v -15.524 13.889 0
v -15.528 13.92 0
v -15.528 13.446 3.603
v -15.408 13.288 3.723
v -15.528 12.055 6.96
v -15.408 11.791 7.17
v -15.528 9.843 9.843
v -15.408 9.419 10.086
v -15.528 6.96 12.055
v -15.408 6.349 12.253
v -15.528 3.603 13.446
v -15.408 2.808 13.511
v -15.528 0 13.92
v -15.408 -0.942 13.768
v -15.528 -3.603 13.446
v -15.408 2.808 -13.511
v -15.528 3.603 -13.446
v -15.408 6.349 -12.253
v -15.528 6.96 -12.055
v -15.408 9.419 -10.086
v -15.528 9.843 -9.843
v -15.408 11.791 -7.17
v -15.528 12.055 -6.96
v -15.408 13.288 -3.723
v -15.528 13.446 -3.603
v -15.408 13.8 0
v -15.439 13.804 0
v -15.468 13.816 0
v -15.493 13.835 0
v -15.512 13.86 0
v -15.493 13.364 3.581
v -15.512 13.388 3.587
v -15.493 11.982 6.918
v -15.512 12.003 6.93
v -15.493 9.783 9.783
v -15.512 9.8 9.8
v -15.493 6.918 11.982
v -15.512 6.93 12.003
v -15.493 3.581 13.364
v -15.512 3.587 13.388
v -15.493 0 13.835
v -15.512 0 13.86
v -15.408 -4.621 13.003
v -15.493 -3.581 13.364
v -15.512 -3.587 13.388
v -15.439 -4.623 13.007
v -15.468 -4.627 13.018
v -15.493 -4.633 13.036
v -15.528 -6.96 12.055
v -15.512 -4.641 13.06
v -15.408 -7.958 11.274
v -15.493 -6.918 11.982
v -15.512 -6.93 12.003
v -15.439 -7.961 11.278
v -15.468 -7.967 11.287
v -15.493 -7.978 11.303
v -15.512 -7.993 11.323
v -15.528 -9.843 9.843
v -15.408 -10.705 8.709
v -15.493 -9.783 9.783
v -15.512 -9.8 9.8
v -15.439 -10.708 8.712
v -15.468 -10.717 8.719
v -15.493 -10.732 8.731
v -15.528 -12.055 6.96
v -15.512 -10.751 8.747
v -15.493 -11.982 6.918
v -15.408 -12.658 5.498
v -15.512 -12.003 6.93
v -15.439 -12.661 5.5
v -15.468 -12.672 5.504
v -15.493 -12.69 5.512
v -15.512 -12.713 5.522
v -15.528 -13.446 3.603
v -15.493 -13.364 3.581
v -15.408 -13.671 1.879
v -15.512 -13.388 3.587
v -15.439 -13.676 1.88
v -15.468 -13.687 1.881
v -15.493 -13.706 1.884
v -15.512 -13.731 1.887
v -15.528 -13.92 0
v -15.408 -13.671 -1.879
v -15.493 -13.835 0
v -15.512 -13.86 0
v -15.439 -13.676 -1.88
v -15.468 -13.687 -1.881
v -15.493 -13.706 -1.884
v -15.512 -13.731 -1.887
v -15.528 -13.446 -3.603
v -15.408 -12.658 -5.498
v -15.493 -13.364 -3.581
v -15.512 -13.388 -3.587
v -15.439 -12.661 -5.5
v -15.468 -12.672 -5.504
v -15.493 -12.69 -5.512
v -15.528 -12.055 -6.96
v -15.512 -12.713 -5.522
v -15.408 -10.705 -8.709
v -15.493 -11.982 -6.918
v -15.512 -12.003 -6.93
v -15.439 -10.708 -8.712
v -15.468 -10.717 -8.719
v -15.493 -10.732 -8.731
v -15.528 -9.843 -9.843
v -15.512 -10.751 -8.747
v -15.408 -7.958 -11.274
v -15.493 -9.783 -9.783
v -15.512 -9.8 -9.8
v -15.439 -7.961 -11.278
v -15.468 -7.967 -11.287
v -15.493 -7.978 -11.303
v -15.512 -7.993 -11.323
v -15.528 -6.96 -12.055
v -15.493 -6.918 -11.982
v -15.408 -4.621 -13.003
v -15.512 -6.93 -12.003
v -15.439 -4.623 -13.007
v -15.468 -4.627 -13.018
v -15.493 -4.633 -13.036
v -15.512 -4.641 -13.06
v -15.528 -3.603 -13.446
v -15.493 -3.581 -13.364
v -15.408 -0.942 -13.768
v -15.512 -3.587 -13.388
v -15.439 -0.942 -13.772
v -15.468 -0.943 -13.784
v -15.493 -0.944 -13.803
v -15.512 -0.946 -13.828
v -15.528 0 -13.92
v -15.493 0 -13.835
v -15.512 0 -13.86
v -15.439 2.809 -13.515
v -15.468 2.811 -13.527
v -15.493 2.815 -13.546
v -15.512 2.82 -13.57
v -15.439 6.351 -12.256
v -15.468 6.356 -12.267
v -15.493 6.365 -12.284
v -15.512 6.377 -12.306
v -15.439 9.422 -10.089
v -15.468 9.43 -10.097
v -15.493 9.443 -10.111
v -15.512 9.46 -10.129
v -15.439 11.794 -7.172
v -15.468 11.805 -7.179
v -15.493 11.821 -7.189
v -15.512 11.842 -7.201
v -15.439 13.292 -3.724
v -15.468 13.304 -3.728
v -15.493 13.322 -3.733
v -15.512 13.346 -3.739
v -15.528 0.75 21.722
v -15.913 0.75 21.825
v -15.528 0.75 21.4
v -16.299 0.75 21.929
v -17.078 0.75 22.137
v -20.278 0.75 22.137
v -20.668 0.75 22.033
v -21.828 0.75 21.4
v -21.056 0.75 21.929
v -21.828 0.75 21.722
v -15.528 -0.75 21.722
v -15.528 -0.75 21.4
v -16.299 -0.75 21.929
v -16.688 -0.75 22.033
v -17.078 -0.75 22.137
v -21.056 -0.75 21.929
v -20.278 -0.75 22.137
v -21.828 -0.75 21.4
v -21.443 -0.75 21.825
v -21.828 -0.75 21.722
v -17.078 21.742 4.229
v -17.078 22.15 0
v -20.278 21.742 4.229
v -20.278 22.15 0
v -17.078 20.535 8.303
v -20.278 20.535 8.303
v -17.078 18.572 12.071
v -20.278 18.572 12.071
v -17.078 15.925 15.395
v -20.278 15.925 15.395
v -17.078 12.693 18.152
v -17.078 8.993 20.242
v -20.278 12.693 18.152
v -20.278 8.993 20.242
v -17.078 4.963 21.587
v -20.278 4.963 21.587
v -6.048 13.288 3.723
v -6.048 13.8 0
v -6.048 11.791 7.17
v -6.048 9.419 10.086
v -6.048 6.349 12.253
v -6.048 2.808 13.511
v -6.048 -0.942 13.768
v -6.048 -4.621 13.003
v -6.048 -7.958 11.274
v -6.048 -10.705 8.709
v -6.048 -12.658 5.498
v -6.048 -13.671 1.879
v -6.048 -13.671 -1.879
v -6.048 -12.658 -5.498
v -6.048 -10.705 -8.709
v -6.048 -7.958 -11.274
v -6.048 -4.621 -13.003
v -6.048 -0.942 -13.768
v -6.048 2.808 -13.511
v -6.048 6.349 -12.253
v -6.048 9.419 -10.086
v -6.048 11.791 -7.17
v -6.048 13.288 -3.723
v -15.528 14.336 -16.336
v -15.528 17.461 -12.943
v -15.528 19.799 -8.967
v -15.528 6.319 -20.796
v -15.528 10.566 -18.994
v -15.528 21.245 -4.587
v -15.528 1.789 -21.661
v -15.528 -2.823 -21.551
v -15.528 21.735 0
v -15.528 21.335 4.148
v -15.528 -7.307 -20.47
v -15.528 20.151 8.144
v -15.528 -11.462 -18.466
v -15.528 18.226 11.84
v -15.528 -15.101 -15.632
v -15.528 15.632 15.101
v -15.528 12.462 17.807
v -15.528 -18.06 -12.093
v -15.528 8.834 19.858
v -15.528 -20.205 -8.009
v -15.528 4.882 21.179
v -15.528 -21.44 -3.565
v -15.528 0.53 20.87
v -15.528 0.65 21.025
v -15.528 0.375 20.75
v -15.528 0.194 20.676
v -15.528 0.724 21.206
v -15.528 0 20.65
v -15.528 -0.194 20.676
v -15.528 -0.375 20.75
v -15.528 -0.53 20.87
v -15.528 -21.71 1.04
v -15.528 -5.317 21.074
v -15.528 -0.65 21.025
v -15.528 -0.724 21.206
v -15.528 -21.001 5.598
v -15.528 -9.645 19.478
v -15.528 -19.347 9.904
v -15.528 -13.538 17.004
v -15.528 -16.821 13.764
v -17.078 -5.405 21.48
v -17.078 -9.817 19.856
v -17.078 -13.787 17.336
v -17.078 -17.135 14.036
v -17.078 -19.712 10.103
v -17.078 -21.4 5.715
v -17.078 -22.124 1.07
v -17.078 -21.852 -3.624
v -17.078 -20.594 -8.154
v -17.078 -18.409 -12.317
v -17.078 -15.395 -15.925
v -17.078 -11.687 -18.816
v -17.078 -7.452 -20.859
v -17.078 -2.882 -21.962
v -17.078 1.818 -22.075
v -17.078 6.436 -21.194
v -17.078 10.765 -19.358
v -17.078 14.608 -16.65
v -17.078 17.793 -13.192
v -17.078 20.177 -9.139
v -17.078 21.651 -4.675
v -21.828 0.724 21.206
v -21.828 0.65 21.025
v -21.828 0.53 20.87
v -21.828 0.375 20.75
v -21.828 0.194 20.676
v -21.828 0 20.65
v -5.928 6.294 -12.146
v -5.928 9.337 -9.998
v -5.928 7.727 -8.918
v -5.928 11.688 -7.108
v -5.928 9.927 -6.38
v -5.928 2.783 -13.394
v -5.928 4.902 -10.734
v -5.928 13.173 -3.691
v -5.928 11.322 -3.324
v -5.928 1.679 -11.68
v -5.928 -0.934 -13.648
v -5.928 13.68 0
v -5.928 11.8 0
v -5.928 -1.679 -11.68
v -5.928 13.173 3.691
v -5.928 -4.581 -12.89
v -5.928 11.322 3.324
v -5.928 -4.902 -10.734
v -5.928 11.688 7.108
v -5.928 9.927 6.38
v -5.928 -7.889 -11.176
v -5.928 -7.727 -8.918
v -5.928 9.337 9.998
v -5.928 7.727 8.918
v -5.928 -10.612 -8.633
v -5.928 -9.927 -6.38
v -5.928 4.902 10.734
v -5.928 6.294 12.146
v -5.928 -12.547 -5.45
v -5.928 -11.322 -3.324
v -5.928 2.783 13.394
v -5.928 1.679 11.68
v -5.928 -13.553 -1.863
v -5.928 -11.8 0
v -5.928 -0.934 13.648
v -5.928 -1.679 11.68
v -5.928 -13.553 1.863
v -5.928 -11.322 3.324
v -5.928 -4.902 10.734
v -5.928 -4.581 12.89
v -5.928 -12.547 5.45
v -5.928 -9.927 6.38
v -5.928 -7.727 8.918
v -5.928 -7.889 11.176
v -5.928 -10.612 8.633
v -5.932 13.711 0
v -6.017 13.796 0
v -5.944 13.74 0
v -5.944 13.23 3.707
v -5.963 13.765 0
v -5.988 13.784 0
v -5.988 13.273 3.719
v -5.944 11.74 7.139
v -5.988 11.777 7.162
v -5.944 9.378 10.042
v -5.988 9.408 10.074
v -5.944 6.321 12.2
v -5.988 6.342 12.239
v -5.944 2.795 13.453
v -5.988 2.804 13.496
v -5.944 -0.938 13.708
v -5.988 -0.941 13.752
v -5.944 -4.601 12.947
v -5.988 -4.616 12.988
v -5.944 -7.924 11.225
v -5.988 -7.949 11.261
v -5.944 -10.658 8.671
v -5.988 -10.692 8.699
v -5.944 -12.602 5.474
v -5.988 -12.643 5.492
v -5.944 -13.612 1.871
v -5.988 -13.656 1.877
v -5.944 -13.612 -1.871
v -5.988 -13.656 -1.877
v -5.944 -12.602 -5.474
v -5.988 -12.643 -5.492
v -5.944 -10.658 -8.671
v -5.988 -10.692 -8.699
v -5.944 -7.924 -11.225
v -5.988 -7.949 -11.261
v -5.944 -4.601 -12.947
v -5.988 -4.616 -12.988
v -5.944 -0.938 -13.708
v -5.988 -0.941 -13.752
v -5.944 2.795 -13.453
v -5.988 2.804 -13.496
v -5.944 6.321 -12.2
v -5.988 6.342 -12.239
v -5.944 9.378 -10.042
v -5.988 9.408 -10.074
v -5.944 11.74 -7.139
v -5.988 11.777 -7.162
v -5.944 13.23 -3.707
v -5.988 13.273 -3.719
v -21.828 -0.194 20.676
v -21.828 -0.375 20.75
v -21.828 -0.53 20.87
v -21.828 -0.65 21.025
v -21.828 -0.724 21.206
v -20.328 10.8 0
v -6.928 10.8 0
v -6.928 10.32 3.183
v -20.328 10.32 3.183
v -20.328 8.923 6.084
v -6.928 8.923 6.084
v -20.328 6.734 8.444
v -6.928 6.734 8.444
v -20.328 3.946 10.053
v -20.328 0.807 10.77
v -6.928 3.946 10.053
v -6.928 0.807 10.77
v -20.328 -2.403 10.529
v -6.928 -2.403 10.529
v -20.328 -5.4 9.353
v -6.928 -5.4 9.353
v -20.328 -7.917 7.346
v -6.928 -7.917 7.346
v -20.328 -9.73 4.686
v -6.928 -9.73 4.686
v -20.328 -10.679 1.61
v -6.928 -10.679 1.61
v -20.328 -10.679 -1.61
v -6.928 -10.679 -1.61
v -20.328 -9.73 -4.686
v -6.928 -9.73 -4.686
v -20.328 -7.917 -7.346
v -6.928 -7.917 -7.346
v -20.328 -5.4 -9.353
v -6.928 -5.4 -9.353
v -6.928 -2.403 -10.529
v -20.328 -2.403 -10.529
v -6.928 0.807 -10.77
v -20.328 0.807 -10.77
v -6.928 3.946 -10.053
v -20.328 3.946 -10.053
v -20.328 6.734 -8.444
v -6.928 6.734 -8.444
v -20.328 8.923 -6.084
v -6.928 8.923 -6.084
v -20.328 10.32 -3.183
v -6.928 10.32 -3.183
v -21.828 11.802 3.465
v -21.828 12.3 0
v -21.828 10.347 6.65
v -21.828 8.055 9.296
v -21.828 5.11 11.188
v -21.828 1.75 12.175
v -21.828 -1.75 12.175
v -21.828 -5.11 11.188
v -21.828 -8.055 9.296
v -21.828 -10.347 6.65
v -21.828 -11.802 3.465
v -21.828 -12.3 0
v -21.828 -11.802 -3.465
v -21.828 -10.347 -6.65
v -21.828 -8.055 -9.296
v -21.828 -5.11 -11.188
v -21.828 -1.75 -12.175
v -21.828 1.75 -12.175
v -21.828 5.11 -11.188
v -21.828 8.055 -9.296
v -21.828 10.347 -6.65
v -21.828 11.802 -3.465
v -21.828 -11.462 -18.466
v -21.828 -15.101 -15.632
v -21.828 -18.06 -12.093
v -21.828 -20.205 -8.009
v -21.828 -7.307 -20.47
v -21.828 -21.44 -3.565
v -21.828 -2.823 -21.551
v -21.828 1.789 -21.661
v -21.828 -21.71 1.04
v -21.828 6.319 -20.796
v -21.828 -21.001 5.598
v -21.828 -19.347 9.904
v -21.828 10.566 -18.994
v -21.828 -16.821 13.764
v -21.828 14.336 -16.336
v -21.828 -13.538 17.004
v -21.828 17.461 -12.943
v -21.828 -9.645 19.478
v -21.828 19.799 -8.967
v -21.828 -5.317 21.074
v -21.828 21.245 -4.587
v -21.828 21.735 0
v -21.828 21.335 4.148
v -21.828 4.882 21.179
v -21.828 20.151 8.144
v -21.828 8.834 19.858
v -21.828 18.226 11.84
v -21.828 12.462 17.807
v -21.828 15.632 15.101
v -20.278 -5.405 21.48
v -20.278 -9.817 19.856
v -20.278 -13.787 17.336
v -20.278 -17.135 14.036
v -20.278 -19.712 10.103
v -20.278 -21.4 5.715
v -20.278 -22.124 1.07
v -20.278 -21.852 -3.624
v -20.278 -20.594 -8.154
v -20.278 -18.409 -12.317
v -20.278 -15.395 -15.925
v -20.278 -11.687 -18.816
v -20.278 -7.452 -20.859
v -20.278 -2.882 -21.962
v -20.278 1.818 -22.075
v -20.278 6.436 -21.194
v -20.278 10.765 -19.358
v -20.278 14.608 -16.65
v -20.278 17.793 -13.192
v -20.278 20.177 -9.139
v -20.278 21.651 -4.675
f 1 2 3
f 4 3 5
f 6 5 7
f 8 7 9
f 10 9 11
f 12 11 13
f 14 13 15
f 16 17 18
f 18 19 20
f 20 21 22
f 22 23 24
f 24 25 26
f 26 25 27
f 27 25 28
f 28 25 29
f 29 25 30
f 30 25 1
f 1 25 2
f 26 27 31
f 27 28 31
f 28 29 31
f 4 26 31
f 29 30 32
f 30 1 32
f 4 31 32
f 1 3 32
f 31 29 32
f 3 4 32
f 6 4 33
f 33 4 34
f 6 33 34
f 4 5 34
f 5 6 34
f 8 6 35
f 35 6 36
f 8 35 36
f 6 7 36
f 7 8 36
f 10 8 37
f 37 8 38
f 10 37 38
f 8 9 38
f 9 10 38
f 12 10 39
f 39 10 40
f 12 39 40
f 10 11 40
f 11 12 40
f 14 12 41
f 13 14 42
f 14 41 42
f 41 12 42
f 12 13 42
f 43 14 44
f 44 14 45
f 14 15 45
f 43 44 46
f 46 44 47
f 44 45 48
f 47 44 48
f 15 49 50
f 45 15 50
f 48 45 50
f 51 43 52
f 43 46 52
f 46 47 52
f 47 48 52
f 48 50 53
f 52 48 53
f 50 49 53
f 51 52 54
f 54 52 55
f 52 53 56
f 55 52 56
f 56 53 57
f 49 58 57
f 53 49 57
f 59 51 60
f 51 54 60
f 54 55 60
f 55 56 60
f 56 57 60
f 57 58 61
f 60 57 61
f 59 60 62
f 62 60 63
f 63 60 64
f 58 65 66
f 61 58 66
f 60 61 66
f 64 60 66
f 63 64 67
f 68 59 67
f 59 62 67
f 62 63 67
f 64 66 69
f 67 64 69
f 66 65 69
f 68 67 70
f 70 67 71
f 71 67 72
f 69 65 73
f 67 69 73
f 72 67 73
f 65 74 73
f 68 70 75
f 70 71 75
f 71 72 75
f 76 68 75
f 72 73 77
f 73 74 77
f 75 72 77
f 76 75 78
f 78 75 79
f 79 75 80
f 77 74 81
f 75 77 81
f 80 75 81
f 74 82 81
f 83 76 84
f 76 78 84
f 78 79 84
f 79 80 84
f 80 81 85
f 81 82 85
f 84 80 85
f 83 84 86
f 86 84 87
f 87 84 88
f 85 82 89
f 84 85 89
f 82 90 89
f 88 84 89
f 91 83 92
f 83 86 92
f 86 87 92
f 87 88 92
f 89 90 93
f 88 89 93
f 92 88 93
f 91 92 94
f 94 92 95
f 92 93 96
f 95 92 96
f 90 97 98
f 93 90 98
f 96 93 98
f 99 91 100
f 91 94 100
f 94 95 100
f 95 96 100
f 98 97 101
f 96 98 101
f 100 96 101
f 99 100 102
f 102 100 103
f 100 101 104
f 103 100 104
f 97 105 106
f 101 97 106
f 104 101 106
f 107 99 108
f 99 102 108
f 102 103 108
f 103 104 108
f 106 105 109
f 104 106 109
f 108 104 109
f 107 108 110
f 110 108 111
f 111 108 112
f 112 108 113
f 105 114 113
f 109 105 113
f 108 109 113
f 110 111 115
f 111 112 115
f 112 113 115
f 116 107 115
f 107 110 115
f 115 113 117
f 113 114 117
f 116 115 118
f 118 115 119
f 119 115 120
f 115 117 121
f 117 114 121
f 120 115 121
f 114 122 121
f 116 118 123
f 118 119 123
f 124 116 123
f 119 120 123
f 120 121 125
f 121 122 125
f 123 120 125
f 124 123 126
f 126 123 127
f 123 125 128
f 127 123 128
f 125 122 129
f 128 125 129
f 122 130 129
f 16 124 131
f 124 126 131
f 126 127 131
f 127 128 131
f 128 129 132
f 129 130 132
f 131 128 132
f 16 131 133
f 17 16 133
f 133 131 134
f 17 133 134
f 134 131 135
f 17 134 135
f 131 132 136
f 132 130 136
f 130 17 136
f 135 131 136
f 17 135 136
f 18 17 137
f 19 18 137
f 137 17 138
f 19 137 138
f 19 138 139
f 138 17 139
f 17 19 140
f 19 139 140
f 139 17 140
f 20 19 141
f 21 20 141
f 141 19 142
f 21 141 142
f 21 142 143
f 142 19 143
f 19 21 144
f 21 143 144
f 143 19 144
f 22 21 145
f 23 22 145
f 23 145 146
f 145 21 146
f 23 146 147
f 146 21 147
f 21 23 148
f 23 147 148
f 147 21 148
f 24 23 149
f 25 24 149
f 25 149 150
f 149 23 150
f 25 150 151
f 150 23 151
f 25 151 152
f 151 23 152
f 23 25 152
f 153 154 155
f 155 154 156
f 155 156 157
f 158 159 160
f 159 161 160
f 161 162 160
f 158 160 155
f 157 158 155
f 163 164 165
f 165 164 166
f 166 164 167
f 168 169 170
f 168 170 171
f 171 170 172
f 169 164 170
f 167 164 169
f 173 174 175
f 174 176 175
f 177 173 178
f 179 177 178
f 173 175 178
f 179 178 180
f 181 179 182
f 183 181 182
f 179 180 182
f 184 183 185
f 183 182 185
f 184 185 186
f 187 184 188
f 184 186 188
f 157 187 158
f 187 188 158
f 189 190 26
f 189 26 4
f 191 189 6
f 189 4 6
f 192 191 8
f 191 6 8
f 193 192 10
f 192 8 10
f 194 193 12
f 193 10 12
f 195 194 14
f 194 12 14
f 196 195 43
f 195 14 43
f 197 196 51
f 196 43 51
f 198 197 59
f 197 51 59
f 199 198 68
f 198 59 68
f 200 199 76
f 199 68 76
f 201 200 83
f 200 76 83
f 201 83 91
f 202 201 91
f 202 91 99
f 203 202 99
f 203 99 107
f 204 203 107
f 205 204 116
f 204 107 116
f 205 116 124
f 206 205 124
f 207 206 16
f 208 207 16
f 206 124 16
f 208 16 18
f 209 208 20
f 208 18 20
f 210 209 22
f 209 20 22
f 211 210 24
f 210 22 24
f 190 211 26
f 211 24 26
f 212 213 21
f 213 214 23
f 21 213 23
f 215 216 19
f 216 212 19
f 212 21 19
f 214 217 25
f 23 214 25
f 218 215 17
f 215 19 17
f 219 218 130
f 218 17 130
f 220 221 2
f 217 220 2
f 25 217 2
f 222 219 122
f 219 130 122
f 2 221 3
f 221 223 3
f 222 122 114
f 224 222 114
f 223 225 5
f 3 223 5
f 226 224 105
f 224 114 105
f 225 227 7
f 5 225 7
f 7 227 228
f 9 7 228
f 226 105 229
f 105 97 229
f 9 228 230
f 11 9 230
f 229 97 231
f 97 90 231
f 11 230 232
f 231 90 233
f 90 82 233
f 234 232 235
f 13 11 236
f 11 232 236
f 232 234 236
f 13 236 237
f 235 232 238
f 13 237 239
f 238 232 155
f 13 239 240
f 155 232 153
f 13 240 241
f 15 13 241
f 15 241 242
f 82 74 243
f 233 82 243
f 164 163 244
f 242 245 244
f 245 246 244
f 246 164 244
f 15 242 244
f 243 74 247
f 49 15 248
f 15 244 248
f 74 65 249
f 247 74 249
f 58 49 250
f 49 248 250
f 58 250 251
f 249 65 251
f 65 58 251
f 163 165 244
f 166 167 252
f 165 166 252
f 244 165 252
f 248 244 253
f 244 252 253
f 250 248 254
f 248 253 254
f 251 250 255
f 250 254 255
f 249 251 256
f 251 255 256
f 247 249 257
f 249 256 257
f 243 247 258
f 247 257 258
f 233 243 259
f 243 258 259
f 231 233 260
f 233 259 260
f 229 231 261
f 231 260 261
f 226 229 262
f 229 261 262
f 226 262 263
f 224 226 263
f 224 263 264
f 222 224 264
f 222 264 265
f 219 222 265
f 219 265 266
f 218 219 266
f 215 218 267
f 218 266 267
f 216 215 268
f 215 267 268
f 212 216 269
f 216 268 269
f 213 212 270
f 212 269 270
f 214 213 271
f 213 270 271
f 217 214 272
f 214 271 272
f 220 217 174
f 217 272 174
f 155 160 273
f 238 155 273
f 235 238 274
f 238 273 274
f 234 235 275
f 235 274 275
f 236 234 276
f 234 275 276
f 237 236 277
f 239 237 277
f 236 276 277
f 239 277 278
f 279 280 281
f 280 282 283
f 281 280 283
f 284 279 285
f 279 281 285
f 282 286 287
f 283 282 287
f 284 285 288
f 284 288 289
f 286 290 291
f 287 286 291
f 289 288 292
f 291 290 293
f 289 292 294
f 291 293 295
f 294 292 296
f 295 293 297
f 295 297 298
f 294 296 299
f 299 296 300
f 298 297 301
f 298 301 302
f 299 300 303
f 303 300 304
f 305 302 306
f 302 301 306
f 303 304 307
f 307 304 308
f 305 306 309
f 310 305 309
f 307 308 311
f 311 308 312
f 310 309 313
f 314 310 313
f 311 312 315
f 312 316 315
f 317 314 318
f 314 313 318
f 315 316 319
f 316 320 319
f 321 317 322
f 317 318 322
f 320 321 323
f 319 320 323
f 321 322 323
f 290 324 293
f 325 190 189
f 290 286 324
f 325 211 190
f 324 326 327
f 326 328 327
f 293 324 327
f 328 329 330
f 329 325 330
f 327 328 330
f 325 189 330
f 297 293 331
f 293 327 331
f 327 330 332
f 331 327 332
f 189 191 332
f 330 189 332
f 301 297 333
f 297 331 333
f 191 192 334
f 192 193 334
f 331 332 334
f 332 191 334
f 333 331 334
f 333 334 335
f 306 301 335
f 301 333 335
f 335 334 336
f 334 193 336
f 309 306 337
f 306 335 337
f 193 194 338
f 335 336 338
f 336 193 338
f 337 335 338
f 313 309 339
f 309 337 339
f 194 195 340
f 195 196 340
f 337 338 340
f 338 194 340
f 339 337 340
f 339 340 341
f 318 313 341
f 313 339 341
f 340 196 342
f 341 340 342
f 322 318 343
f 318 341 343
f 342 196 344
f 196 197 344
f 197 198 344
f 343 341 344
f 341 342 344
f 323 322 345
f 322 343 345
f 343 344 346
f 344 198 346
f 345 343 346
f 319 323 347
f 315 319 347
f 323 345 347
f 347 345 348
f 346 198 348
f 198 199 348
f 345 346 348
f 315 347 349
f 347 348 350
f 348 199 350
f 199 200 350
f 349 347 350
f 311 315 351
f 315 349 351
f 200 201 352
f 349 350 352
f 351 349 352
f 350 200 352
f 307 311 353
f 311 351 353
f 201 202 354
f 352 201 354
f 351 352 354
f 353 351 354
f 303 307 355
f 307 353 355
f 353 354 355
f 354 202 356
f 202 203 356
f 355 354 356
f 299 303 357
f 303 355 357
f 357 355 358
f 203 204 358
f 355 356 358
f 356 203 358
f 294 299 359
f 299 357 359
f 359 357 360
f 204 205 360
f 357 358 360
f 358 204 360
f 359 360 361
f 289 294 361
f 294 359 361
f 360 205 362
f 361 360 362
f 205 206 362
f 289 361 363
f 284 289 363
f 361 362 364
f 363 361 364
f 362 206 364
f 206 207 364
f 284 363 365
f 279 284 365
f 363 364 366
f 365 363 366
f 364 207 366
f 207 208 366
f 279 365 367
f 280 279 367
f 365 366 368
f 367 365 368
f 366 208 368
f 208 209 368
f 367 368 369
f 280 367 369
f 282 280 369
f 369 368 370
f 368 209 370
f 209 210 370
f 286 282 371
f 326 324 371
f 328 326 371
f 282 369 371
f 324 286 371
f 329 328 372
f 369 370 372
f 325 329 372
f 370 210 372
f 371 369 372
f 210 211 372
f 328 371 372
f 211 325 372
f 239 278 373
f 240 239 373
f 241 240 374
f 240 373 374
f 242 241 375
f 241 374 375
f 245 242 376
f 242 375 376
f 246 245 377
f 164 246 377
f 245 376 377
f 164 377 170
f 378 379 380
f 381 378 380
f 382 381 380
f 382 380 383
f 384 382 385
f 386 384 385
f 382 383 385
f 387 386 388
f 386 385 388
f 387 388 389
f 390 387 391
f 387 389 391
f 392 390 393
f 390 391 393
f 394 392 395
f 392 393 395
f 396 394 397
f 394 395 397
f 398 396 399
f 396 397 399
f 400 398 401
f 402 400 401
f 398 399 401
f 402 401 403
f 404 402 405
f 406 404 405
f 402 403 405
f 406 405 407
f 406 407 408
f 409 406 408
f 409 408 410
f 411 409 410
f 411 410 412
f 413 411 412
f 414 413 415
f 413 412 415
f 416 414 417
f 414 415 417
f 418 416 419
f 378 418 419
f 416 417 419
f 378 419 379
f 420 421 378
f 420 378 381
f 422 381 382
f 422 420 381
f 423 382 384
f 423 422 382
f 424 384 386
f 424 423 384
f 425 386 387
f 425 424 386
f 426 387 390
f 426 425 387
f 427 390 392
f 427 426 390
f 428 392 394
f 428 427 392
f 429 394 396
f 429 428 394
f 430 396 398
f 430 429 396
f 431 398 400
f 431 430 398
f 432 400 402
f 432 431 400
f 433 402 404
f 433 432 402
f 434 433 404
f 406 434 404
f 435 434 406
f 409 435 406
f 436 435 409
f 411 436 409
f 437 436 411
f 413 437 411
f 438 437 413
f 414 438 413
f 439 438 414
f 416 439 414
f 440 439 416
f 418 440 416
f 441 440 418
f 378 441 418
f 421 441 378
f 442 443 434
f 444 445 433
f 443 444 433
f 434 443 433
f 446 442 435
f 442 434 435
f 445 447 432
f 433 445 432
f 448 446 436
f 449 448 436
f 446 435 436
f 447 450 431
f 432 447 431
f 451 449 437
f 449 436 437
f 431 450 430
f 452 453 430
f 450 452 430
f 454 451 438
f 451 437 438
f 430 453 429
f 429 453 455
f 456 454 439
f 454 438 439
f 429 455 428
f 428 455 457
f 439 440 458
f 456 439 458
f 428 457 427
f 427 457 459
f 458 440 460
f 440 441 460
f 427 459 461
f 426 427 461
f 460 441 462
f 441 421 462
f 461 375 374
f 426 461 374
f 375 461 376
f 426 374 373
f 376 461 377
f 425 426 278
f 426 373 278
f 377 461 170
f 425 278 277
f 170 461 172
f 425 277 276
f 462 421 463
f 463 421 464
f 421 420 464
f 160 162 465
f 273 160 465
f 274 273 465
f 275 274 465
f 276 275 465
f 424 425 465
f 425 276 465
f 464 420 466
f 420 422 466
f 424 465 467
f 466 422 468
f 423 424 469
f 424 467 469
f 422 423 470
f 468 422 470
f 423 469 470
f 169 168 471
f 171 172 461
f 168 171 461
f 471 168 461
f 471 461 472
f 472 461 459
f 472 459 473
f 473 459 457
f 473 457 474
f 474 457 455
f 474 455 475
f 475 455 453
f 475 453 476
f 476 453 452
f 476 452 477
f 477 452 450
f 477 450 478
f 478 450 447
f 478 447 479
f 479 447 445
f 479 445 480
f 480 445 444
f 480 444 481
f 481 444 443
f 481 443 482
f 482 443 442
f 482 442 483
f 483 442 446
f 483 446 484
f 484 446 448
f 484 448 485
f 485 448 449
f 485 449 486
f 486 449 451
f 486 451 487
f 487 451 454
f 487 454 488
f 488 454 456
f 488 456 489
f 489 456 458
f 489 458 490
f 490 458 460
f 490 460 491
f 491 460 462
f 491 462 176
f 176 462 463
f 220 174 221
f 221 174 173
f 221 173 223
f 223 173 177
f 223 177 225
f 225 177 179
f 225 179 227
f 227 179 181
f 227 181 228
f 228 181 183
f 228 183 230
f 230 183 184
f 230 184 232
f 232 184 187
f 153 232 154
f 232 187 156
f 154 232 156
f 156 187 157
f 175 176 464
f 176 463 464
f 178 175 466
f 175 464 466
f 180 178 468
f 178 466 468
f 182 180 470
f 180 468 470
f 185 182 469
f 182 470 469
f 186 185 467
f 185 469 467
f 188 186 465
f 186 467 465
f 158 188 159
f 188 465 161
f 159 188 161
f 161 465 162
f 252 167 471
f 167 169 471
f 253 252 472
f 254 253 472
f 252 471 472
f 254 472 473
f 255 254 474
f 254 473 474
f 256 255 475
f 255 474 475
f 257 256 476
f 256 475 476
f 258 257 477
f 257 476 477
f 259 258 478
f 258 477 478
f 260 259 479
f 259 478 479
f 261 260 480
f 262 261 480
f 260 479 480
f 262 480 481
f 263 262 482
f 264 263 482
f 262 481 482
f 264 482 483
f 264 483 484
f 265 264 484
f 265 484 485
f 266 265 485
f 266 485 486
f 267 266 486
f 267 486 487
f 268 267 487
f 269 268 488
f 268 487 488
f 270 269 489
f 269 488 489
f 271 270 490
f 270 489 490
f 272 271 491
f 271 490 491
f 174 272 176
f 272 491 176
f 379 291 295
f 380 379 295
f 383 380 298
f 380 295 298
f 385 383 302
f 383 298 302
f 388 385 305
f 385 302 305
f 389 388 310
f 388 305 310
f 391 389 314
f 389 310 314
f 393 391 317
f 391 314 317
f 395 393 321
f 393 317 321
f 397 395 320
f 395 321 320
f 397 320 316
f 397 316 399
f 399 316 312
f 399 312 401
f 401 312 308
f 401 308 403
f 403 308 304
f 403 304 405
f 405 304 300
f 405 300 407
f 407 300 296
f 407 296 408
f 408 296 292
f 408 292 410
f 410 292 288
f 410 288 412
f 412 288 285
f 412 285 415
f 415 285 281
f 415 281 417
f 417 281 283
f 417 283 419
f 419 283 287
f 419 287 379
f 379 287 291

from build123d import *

# Parameters (mm, degrees)
F2_SIZE  = 1
F3_SIZE  = 1.5
F5_DEPTH = 25
F6_R     = 0.12


with BuildPart() as f1:
    # F0 (on Top) → F1 (revolve)
    with BuildSketch(Plane.XY):
        Polygon((-20.277789, 22.15), (-21.827789, 21.734679), (-21.827789, 10.8), (-5.927789, 10.8), (-5.927789, 13.8), (-15.527789, 13.8), (-15.527789, 21.734679), (-17.077789, 22.15), align=None)
    revolve(axis=Axis((-0.12533, 0, 0), (1, 0, 0)))

    # F2
    f2_edges = [f1.edges().sort_by_distance(p)[0] for p in [
        (-5.927789, -10.8, 0),
    ]]
    chamfer(f2_edges, length=F2_SIZE)

    # F3
    f3_edges = [f1.edges().sort_by_distance(p)[0] for p in [
        (-21.827789, -10.8, 0),
    ]]
    chamfer(f3_edges, length=F3_SIZE)

    # F4 (on face) → F5 (cut)
    with BuildSketch(Plane(origin=(-21.827789, 0, 0), x_dir=(0, -1, 0), z_dir=(-1, 0, 0))):
        with BuildLine():
            ThreePointArc((-0.75, 21.4), (-0.53033, 20.86967), (0, 20.65))
            Line((0, 20.65), (0, 23.059197))
            Line((0, 23.059197), (-0.75, 23.059197))
            Line((-0.75, 23.059197), (-0.75, 21.4))
        make_face()
        with BuildLine():
            Line((0, 23.059197), (0, 20.65))
            ThreePointArc((0, 20.65), (0.53033, 20.86967), (0.75, 21.4))
            Line((0.75, 21.4), (0.75, 23.059197))
            Line((0.75, 23.059197), (0, 23.059197))
        make_face()
        with BuildLine():
            ThreePointArc((0, 21.734679), (0.375056, 21.731443), (0.75, 21.721735))
            Line((0.75, 21.721735), (0.75, 23.059197))
            Line((0.75, 23.059197), (0, 23.059197))
            Line((0, 23.059197), (0, 21.734679))
        make_face()
        with BuildLine():
            Line((-0.75, 23.059197), (-0.75, 21.721735))
            ThreePointArc((-0.75, 21.721735), (-0.375056, 21.731443), (0, 21.734679))
            Line((0, 21.734679), (0, 23.059197))
            Line((0, 23.059197), (-0.75, 23.059197))
        make_face()
        with BuildLine():
            ThreePointArc((0, 21.734679), (-0.375056, 21.731443), (-0.75, 21.721735))
            Line((-0.75, 21.721735), (-0.75, 21.4))
            ThreePointArc((-0.75, 21.4), (-0.53033, 20.86967), (0, 20.65))
            Line((0, 20.65), (0, 21.734679))
        make_face()
        with BuildLine():
            Line((0.75, 21.4), (0.75, 21.721735))
            ThreePointArc((0.75, 21.721735), (0.375056, 21.731443), (0, 21.734679))
            Line((0, 21.734679), (0, 20.65))
            ThreePointArc((0, 20.65), (0.53033, 20.86967), (0.75, 21.4))
        make_face()
    extrude(amount=-F5_DEPTH, mode=Mode.SUBTRACT)

    # F6
    f6_edges = [f1.edges().sort_by_distance(p)[0] for p in [
        (-15.527789, -13.8, 0),
        (-5.927789, -13.8, 0),
    ]]
    fillet(f6_edges, radius=F6_R)


solid = f1.part
